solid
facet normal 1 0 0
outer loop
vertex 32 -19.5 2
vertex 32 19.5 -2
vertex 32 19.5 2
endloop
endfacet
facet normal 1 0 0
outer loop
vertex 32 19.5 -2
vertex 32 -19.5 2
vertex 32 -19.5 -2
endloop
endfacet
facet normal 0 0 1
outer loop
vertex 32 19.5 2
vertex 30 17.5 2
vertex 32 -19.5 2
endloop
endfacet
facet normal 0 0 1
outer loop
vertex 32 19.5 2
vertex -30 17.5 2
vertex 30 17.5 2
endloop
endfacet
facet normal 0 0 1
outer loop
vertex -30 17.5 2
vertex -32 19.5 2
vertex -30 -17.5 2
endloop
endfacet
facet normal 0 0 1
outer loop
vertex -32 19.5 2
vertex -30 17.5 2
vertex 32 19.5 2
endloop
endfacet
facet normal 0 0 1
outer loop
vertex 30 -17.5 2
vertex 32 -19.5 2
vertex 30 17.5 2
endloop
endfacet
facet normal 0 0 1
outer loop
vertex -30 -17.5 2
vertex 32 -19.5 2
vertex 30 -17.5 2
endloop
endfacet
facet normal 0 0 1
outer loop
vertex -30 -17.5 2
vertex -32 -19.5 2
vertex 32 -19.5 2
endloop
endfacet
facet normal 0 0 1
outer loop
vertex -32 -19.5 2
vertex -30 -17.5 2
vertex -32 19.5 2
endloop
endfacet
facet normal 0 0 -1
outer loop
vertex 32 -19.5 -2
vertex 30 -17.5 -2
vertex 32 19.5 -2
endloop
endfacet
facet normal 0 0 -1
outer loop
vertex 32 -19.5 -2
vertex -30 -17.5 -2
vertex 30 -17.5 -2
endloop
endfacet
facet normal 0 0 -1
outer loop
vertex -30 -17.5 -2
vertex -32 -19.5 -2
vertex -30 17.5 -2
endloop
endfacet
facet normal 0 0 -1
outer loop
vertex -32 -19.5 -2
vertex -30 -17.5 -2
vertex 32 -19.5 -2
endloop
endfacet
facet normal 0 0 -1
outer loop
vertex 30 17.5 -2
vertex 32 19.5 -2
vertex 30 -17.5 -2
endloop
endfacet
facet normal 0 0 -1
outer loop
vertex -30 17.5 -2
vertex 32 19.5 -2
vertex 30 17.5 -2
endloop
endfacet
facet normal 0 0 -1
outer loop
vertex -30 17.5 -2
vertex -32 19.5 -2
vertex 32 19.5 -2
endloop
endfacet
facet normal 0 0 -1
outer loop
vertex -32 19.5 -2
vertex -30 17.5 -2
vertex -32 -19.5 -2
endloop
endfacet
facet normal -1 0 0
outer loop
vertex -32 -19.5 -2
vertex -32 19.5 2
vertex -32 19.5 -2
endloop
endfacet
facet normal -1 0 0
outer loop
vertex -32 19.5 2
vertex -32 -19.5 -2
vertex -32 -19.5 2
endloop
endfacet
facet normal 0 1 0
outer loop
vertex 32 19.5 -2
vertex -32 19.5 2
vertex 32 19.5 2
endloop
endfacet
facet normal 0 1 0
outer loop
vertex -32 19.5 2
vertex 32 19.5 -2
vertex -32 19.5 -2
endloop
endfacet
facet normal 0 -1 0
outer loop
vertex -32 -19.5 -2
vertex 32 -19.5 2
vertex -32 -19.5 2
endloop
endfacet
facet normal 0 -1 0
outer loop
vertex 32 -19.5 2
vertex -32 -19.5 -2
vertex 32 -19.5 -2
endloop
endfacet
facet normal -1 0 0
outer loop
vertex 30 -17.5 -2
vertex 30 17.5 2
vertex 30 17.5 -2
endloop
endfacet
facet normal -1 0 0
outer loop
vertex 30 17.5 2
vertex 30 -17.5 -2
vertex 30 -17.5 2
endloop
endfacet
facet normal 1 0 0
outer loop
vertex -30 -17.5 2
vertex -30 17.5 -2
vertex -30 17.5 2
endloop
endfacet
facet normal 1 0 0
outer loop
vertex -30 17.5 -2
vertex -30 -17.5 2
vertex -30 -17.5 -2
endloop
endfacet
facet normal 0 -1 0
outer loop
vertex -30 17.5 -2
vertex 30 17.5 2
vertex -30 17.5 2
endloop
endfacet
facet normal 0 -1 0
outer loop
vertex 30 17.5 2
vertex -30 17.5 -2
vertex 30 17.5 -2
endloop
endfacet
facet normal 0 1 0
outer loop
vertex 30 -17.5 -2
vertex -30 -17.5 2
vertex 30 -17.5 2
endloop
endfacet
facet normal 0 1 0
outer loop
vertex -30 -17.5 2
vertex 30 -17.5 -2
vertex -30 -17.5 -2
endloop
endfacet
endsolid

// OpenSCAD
echo("Работа Воробьева Савелия");
w_frame = 65;
d_frame = 5;
h_frame = 41;
thickness_frame = 4;
thickness_walls = 2;
thickness_bottom = 2;
h_walls = 4;

w_back = 60;
h_back = 35;
thickness_back = 1;

walls();

module walls(){
    difference(){
        cube([w_back + 2 * thickness_walls, h_back + 2 * thickness_walls, h_walls], center = true);
        color("red")
        cube([w_back, h_back, h_walls + 1], center = true);
    }   
}

//rotate([90, 0, 0])
//translate([0, 0, 3]);
//backlight()

module bottom() {}

module backlight() {
  color("lightgreen")
  cube([w_back, h_back, thickness_back], center=true);
}

module frame1() {
  difference(){
    cube([w_frame,d_frame,h_frame],center=true);
    color("red")
    cube([w_frame-2*thickness_frame, d_frame+1, h_frame-2*thickness_frame], center = true);    
  }
}
